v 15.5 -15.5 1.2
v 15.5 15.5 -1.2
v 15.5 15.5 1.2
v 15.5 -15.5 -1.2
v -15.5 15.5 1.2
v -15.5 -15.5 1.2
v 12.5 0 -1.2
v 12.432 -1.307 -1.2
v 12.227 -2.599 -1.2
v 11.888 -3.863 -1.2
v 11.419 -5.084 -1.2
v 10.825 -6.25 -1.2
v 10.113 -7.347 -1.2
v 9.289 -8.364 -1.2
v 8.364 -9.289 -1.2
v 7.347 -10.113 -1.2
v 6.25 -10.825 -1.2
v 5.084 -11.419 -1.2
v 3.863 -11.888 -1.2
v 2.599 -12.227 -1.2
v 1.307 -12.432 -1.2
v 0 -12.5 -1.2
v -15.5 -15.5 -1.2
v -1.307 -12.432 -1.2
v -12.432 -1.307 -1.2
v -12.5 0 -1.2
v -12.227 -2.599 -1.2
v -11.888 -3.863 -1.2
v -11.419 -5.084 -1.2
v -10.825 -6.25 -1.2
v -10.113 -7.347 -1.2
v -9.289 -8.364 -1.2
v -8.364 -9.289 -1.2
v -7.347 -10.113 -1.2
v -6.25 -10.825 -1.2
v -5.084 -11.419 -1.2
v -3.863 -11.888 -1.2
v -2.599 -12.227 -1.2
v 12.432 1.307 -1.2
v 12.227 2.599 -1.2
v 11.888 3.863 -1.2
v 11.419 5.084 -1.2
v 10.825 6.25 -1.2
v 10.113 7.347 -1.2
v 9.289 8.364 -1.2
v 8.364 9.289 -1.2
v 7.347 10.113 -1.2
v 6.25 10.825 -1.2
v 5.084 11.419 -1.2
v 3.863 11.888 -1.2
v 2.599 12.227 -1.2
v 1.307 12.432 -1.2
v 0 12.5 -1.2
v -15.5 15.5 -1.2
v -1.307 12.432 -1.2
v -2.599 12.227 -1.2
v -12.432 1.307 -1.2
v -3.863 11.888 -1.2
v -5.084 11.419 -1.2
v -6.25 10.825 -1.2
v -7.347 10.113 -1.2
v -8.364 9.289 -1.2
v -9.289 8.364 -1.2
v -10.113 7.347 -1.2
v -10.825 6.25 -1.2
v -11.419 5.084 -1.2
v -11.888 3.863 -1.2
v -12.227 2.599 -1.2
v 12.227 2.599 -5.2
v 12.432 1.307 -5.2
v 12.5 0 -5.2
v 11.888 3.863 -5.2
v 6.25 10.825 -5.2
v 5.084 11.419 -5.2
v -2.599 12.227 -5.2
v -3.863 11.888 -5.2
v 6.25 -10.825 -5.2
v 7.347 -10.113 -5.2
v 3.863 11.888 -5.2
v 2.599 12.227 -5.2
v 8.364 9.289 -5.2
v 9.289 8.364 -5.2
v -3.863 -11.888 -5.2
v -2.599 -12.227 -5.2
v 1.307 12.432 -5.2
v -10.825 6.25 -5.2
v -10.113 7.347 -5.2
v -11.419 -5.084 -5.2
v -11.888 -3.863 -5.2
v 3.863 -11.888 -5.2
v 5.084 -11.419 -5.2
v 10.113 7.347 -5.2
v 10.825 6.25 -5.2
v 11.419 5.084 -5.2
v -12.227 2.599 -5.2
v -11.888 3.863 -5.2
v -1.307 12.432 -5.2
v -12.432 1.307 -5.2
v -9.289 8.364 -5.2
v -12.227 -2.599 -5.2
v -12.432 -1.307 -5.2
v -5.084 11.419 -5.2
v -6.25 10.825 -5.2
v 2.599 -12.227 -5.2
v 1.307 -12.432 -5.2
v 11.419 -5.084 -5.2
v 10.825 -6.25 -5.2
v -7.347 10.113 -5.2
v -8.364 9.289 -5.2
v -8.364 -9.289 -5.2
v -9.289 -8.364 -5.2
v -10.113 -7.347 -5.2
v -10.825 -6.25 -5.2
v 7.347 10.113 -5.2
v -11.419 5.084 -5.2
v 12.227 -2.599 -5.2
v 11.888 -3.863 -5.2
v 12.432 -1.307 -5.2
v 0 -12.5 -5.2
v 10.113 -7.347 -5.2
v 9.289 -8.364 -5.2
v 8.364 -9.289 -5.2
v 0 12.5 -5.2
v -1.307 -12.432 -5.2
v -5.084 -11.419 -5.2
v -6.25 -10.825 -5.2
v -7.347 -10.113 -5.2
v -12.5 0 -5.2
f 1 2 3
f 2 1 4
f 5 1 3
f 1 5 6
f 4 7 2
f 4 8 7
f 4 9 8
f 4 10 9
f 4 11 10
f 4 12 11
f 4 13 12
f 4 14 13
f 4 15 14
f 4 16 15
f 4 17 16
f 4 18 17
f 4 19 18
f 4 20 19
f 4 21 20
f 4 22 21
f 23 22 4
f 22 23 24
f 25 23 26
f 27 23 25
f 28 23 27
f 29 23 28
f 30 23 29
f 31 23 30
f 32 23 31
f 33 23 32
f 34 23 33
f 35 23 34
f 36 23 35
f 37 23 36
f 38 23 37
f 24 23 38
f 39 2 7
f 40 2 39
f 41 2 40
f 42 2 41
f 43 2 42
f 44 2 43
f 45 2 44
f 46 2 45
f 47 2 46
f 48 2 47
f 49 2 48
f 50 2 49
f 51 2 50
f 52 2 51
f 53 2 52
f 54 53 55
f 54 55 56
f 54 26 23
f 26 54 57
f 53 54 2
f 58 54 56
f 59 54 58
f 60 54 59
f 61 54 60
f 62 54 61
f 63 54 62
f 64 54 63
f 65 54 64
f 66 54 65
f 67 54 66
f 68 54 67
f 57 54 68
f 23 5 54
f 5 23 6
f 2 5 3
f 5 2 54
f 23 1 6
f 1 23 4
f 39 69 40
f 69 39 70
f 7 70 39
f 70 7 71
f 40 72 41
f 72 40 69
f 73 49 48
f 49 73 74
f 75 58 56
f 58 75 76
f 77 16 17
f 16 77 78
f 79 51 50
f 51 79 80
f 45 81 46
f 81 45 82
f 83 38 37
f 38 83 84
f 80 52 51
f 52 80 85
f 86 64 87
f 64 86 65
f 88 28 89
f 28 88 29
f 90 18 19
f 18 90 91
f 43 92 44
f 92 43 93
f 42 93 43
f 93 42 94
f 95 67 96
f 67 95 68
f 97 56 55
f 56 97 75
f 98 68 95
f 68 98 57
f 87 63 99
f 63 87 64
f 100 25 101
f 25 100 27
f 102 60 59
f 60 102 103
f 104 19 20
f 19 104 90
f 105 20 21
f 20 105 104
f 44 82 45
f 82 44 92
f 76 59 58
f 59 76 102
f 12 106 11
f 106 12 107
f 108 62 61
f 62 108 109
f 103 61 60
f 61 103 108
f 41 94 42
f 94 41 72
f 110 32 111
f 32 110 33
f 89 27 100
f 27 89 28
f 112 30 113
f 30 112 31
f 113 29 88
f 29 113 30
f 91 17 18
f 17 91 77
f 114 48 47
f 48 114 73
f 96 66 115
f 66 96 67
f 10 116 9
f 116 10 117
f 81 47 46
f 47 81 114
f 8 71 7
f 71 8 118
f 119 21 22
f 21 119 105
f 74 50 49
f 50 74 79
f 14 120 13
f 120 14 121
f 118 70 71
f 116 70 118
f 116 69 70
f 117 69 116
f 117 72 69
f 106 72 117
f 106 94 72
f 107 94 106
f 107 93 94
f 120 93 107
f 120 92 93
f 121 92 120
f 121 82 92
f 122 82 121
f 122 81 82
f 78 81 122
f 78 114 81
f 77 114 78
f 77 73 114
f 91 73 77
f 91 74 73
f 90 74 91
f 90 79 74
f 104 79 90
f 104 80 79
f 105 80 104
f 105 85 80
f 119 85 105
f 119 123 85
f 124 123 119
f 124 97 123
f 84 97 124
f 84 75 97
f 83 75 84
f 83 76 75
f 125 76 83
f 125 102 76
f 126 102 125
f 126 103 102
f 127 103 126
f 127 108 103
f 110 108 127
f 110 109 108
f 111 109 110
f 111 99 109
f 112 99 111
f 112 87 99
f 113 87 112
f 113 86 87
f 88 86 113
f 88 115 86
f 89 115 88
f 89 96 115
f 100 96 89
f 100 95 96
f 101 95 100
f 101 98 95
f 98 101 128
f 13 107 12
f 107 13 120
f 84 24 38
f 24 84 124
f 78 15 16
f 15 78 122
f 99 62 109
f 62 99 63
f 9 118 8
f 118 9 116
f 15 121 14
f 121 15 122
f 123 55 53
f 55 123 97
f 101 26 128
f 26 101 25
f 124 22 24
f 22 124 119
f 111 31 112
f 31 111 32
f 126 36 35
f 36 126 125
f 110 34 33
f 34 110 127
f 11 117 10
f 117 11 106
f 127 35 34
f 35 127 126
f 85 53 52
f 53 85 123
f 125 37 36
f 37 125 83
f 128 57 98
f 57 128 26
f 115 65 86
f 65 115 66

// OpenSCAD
// Press-fit end cap for 30 mm extrusion.
$fn = 60;
eps = 0.02;
profile = 30;
cap_t = 2.4;
wall = 2.5;
pin_d = profile - 2 * wall;
pin_l = 4;
union() {
    cube([profile + 1, profile + 1, cap_t], center = true);
    translate([0, 0, -cap_t / 2 - pin_l]) cylinder(d = pin_d, h = pin_l + eps);
}
